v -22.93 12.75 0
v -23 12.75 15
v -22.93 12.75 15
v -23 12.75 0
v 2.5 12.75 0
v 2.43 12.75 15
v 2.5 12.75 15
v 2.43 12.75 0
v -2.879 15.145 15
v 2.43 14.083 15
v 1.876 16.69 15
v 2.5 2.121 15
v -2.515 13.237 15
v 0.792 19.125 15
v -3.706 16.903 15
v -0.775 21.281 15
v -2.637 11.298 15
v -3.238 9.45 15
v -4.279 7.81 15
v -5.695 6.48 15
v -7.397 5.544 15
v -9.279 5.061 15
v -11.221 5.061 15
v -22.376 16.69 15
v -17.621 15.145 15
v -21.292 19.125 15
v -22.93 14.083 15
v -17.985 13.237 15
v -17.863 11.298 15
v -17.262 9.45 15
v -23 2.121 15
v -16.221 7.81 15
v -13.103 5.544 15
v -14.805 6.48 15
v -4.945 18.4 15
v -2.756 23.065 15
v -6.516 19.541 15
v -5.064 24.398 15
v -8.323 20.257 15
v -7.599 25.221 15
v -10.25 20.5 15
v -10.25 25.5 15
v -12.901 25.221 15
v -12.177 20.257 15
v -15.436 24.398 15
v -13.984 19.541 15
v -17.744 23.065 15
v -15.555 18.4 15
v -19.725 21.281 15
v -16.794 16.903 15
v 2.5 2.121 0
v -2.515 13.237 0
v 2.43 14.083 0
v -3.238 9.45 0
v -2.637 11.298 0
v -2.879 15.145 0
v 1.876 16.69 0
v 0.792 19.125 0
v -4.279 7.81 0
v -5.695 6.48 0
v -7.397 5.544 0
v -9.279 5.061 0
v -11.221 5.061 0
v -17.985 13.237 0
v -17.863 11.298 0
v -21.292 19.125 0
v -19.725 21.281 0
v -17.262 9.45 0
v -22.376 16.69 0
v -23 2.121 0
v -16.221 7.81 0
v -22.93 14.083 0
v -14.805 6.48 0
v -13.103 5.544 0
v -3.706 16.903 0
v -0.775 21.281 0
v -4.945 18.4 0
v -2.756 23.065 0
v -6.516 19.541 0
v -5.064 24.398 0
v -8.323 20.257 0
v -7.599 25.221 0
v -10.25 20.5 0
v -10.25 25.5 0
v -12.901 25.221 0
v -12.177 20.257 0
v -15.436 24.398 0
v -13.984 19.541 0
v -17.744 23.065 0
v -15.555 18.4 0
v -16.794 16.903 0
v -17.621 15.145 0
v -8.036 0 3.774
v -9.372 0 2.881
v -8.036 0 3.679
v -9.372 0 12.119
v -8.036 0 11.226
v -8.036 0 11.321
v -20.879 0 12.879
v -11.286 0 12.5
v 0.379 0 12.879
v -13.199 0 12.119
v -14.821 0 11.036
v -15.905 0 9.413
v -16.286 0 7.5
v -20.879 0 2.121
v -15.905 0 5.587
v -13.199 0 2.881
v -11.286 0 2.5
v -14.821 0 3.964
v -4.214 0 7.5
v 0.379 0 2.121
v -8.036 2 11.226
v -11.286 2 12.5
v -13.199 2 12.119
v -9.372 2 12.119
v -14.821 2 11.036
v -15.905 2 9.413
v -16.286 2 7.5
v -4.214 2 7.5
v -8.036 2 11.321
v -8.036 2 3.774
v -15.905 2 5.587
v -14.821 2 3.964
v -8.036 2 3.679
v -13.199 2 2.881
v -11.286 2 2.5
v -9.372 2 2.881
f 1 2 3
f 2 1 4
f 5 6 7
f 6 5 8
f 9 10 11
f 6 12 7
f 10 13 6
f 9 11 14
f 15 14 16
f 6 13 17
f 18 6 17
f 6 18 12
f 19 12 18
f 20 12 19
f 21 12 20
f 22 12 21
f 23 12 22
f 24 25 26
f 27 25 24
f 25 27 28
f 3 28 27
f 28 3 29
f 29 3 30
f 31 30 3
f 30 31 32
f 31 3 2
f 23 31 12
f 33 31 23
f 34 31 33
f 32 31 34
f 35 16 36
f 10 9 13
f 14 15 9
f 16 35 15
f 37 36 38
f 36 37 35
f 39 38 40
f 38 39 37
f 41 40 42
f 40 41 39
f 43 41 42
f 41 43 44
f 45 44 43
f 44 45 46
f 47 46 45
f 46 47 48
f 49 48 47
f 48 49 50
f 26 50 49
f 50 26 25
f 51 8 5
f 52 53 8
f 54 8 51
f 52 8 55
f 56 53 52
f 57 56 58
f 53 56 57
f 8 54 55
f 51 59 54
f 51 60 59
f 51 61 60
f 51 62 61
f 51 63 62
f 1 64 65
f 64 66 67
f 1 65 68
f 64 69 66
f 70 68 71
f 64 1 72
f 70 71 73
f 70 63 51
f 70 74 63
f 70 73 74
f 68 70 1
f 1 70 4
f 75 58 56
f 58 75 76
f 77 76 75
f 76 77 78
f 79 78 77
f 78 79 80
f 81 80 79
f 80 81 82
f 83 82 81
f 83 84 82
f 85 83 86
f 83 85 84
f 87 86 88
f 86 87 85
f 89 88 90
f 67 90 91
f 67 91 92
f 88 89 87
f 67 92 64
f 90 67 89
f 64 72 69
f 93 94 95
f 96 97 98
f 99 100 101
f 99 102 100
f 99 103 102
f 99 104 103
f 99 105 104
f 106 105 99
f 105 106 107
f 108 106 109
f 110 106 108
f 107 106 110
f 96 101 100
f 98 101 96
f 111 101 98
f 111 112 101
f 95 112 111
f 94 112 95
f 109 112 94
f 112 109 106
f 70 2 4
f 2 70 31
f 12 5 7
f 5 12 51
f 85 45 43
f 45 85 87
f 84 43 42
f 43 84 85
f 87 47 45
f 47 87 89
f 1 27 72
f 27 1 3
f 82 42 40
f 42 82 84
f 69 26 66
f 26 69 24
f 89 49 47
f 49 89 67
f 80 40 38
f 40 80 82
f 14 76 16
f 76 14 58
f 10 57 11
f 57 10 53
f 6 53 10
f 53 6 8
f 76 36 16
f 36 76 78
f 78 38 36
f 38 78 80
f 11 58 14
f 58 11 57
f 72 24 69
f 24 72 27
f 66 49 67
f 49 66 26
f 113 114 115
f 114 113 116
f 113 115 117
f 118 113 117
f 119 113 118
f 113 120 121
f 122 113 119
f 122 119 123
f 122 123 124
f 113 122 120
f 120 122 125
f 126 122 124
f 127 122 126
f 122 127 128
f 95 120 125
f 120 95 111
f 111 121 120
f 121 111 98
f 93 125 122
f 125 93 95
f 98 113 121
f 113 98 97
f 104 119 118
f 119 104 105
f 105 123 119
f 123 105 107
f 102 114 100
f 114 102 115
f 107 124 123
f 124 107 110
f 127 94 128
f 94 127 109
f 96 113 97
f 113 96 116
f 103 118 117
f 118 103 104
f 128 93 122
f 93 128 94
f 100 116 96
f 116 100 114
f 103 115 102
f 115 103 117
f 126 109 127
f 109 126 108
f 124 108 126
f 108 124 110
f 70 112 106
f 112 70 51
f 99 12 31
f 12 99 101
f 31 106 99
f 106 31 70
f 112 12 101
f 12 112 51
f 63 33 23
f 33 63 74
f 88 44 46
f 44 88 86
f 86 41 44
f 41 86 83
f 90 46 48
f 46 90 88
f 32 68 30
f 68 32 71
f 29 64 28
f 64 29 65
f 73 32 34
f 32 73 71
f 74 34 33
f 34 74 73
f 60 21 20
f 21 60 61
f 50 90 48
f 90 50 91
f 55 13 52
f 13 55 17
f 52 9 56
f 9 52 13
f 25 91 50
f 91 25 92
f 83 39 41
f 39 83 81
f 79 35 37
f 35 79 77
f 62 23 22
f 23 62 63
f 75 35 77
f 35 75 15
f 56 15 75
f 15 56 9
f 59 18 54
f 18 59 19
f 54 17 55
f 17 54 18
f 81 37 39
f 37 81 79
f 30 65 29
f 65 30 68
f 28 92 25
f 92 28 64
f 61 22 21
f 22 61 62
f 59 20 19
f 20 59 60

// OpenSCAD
// Sized RepRap Power Ring
// By fillibar
// Description:
//   This ring is based on the parametric power ring. Rather than use specific values that
//   some may not know I used the "standard" ring sizes for most of the world. Enter the region
//   then the other parameters. The SizedPowerRing module will just call the normal PowerRing
//   module with the correct inner size.
//
// Based on:
//  Parametric RepRap Power Ring by Daniel Harmsworth (http://www.thingiverse.com/thing:3917)
//  RepRap Power Ring by Zack Hoeken (http://www.thingiverse.com/thing:48)
//  Ring sizes per Wikipedia (http://en.wikipedia.org/wiki/Ring_size)
//
// Licensed under the Creative Commons - GNU GPL, http://creativecommons.org/licenses/GPL/2.0/
//
// Parameters are as follows:
// 1) Sets ring sizing region. Values are:
//   0 for United States and Canada
//   1 for UK, Ireland, Australia & New Zealand (Please note: "" is needed around non-numerical values)
//   2 for India, China & Japan
//   3 for Switzerland
// 2) Sets internal ring size based on ring sizes for the region set in parameter 1.
// 3) Sets thickness of the ring (lengthways along the finger).
// 4) Sets depth of the RepRap logo embossed on the ring.
// 5) Sets whether the front edges are beveled or not.

// The following examples all generate the same ring, per region:
//SizedPowerRing ( 0, 13, 25, 1, true );
//SizedPowerRing ( 1, "N.5", 25, 1, true );
//SizedPowerRing ( 2, 14, 25, 1, true );
//SizedPowerRing ( 3, 15.25, 25, 1, true );
PowerRing( 15.5, 15, 2, true );

module SizedPowerRing ( region, size, thickness, depth, beveled )
{
  if ( region == 0 ) {
    if ( size == 0 ) {
      PowerRing( 11.63, thickness, depth, beveled );
    }
    if ( size == 0.25 ) {
      PowerRing( 11.84, thickness, depth, beveled );
    }
    if ( size == 0.5 ) {
      PowerRing( 12.04, thickness, depth, beveled );
    }
    if ( size == 0.75 ) {
      PowerRing( 12.24, thickness, depth, beveled );
    }
    if ( size == 1 ) {
      PowerRing( 12.45, thickness, depth, beveled );
    }
    if ( size == 1.25 ) {
      PowerRing( 12.65, thickness, depth, beveled );
    }
    if ( size == 1.5 ) {
      PowerRing( 12.85, thickness, depth, beveled );
    }
    if ( size == 1.75 ) {
      PowerRing( 13.06, thickness, depth, beveled );
    }
    if ( size == 2 ) {
      PowerRing( 13.26, thickness, depth, beveled );
    }
    if ( size == 2.25 ) {
      PowerRing( 13.46, thickness, depth, beveled );
    }
    if ( size == 2.5 ) {
      PowerRing( 13.67, thickness, depth, beveled );
    }
    if ( size == 2.75 ) {
      PowerRing( 13.87, thickness, depth, beveled );
    }
    if ( size == 3 ) {
      PowerRing( 14.07, thickness, depth, beveled );
    }
    if ( size == 3.25 ) {
      PowerRing( 14.27, thickness, depth, beveled );
    }
    if ( size == 3.5 ) {
      PowerRing( 14.48, thickness, depth, beveled );
    }
    if ( size == 3.75 ) {
      PowerRing( 14.68, thickness, depth, beveled );
    }
    if ( size == 4 ) {
      PowerRing( 14.88, thickness, depth, beveled );
    }
    if ( size == 4.25 ) {
      PowerRing( 15.09, thickness, depth, beveled );
    }
    if ( size == 4.5 ) {
      PowerRing( 15.29, thickness, depth, beveled );
    }
    if ( size == 4.75 ) {
      PowerRing( 15.49, thickness, depth, beveled );
    }
    if ( size == 5 ) {
      PowerRing( 15.70, thickness, depth, beveled );
    }
    if ( size == 5.25 ) {
      PowerRing( 15.90, thickness, depth, beveled );
    }
    if ( size == 5.5 ) {
      PowerRing( 16.10, thickness, depth, beveled );
    }
    if ( size == 5.75 ) {
      PowerRing( 16.31, thickness, depth, beveled );
    }
    if ( size == 6 ) {
      PowerRing( 16.51, thickness, depth, beveled );
    }
    if ( size == 6.25 ) {
      PowerRing( 16.71, thickness, depth, beveled );
    }
    if ( size == 6.5 ) {
      PowerRing( 16.92, thickness, depth, beveled );
    }
    if ( size == 6.75 ) {
      PowerRing( 17.12, thickness, depth, beveled );
    }
    if ( size == 7 ) {
      PowerRing( 17.32, thickness, depth, beveled );
    }
    if ( size == 7.25 ) {
      PowerRing( 17.53, thickness, depth, beveled );
    }
    if ( size == 7.5 ) {
      PowerRing( 17.73, thickness, depth, beveled );
    }
    if ( size == 7.75 ) {
      PowerRing( 17.93, thickness, depth, beveled );
    }
    if ( size == 8 ) {
      PowerRing( 18.14, thickness, depth, beveled );
    }
    if ( size == 8.25 ) {
      PowerRing( 18.34, thickness, depth, beveled );
    }
    if ( size == 8.5 ) {
      PowerRing( 18.54, thickness, depth, beveled );
    }
    if ( size == 8.75 ) {
      PowerRing( 18.75, thickness, depth, beveled );
    }
    if ( size == 9 ) {
      PowerRing( 18.95, thickness, depth, beveled );
    }
    if ( size == 9.25 ) {
      PowerRing( 19.15, thickness, depth, beveled );
    }
    if ( size == 9.5 ) {
      PowerRing( 19.35, thickness, depth, beveled );
    }
    if ( size == 9.75 ) {
      PowerRing( 19.56, thickness, depth, beveled );
    }
    if ( size == 10 ) {
      PowerRing( 19.76, thickness, depth, beveled );
    }
    if ( size == 10.25 ) {
      PowerRing( 19.96, thickness, depth, beveled );
    }
    if ( size == 10.5 ) {
      PowerRing( 20.17, thickness, depth, beveled );
    }
    if ( size == 10.75 ) {
      PowerRing( 20.37, thickness, depth, beveled );
    }
    if ( size == 11 ) {
      PowerRing( 20.57, thickness, depth, beveled );
    }
    if ( size == 11.25 ) {
      PowerRing( 20.78, thickness, depth, beveled );
    }
    if ( size == 11.5 ) {
      PowerRing( 20.98, thickness, depth, beveled );
    }
    if ( size == 11.75 ) {
      PowerRing( 21.18, thickness, depth, beveled );
    }
    if ( size == 12 ) {
      PowerRing( 21.39, thickness, depth, beveled );
    }
    if ( size == 12.25 ) {
      PowerRing( 21.59, thickness, depth, beveled );
    }
    if ( size == 12.5 ) {
      PowerRing( 21.79, thickness, depth, beveled );
    }
    if ( size == 12.75 ) {
      PowerRing( 22.00, thickness, depth, beveled );
    }
    if ( size == 13 ) {
      PowerRing( 22.20, thickness, depth, beveled );
    }
    if ( size == 13.25 ) {
      PowerRing( 22.40, thickness, depth, beveled );
    }
    if ( size == 13.5 ) {
      PowerRing( 22.61, thickness, depth, beveled );
    }
    if ( size == 13.75 ) {
      PowerRing( 22.81, thickness, depth, beveled );
    }
    if ( size == 14 ) {
      PowerRing( 23.01, thickness, depth, beveled );
    }
    if ( size == 14.25 ) {
      PowerRing( 23.22, thickness, depth, beveled );
    }
    if ( size == 14.5 ) {
      PowerRing( 23.42, thickness, depth, beveled );
    }
    if ( size == 14.75 ) {
      PowerRing( 23.62, thickness, depth, beveled );
    }
    if ( size == 15 ) {
      PowerRing( 23.83, thickness, depth, beveled );
    }
    if ( size == 15.25 ) {
      PowerRing( 24.03, thickness, depth, beveled );
    }
    if ( size == 15.5 ) {
      PowerRing( 24.23, thickness, depth, beveled );
    }
    if ( size == 15.75 ) {                                                                            
      PowerRing( 24.43, thickness, depth, beveled );
    }
    if ( size == 16 ) {                                                                                                       
      PowerRing( 24.64, thickness, depth, beveled );
    }
  } 
  if ( region == 1 ) {
    if ( size == "A" ) {
      PowerRing( 12.04, thickness, depth, beveled );
    }
    if ( size == "A.5" ) {
      PowerRing( 12.24, thickness, depth, beveled );
    }
    if ( size == "B" ) {
      PowerRing( 12.45, thickness, depth, beveled );
    }
    if ( size == "B.5" ) {
      PowerRing( 12.65, thickness, depth, beveled );
    }
    if ( size == "C" ) {
      PowerRing( 12.85, thickness, depth, beveled );
    }
    if ( size == "C.5" ) {
      PowerRing( 13.06, thickness, depth, beveled );
    }
    if ( size == "D" ) {
      PowerRing( 13.26, thickness, depth, beveled );
    }
    if ( size == "D.5" ) {
      PowerRing( 13.46, thickness, depth, beveled );
    }
    if ( size == "E" ) {
      PowerRing( 13.67, thickness, depth, beveled );
    }
    if ( size == "E.5" ) {
      PowerRing( 13.87, thickness, depth, beveled );
    }
    if ( size == "F" ) {
      PowerRing( 14.07, thickness, depth, beveled );
    }
    if ( size == "F.5" ) {
      PowerRing( 14.27, thickness, depth, beveled );
    }
    if ( size == "G" ) {
      PowerRing( 14.48, thickness, depth, beveled );
    }
    if ( size == "G.5" ) {
      PowerRing( 14.68, thickness, depth, beveled );
    }
    if ( size == "H" ) {
      PowerRing( 14.88, thickness, depth, beveled );
    }
    if ( size == "H.5" ) {
      PowerRing( 15.09, thickness, depth, beveled );
    }
    if ( size == "I" ) {
      PowerRing( 15.29, thickness, depth, beveled );
    }
    if ( size == "J" ) {
      PowerRing( 15.49, thickness, depth, beveled );
    }
    if ( size == "J.5" ) {
      PowerRing( 15.70, thickness, depth, beveled );
    }
    if ( size == "K" ) {
      PowerRing( 15.90, thickness, depth, beveled );
    }
    if ( size == "K.5" ) {
      PowerRing( 16.10, thickness, depth, beveled );
    }
    if ( size == "L" ) {
      PowerRing( 16.31, thickness, depth, beveled );
    }
    if ( size == "L.5" ) {
      PowerRing( 16.51, thickness, depth, beveled );
    }
    if ( size == "M" ) {
      PowerRing( 16.71, thickness, depth, beveled );
    }
    if ( size == "M.5" ) {
      PowerRing( 16.92, thickness, depth, beveled );
    }
    if ( size == "N" ) {
      PowerRing( 17.12, thickness, depth, beveled );
    }
    if ( size == "N.5" ) {
      PowerRing( 17.32, thickness, depth, beveled );
    }
    if ( size == "O" ) {
      PowerRing( 17.53, thickness, depth, beveled );
    }
    if ( size == "O.5" ) {
      PowerRing( 17.73, thickness, depth, beveled );
    }
    if ( size == "P" ) {
      PowerRing( 17.93, thickness, depth, beveled );
    }
    if ( size == "P.5" ) {
      PowerRing( 18.14, thickness, depth, beveled );
    }
    if ( size == "Q" ) {
      PowerRing( 18.34, thickness, depth, beveled );
    }
    if ( size == "Q.5" ) {
      PowerRing( 18.54, thickness, depth, beveled );
    }
    if ( size == "R" ) {
      PowerRing( 18.75, thickness, depth, beveled );
    }
    if ( size == "R.5" ) {
      PowerRing( 18.95, thickness, depth, beveled );
    }
    if ( size == "S" ) {
      PowerRing( 19.15, thickness, depth, beveled );
    }
    if ( size == "S.5" ) {
      PowerRing( 19.35, thickness, depth, beveled );
    }
    if ( size == "T" ) {
      PowerRing( 19.56, thickness, depth, beveled );
    }
    if ( size == "T.5" ) {
      PowerRing( 19.76, thickness, depth, beveled );
    }
    if ( size == "U" ) {
      PowerRing( 19.96, thickness, depth, beveled );
    }
    if ( size == "U.5" ) {
      PowerRing( 20.17, thickness, depth, beveled );
    }
    if ( size == "V" ) {
      PowerRing( 20.37, thickness, depth, beveled );
    }
    if ( size == "V.5" ) {
      PowerRing( 20.57, thickness, depth, beveled );
    }
    if ( size == "W" ) {
      PowerRing( 20.78, thickness, depth, beveled );
    }
    if ( size == "W.5" ) {
      PowerRing( 20.98, thickness, depth, beveled );
    }
    if ( size == "X" ) {
      PowerRing( 21.18, thickness, depth, beveled );
    }
    if ( size == "X.5" ) {
      PowerRing( 21.39, thickness, depth, beveled );
    }
    if ( size == "Y" ) {
      PowerRing( 21.59, thickness, depth, beveled );
    }
    if ( size == "Z" ) {
      PowerRing( 21.79, thickness, depth, beveled );
    }
    if ( size == "Z.5" ) {
      PowerRing( 22.00, thickness, depth, beveled );
    }
    if ( size == "Z1" ) {
      PowerRing( 22.40, thickness, depth, beveled );
    }
    if ( size == "Z2" ) {
      PowerRing( 22.81, thickness, depth, beveled );
    }
    if ( size == "Z3" ) {
      PowerRing( 23.01, thickness, depth, beveled );
    }
    if ( size == "Z4" ) {
     PowerRing( 23.42, thickness, depth, beveled );
    }
  }
  if ( region == 2 ) {
    if ( size == 1 ) {
      PowerRing( 12.45, thickness, depth, beveled );
    }
    if ( size == 2 ) {
      PowerRing( 13.26, thickness, depth, beveled );
    }
    if ( size == 3 ) {
      PowerRing( 13.67, thickness, depth, beveled );
    }
    if ( size == 4 ) {
      PowerRing( 14.07, thickness, depth, beveled );
    }
    if ( size == 5 ) {
      PowerRing( 14.27, thickness, depth, beveled );
    }
    if ( size == 6 ) {
      PowerRing( 14.68, thickness, depth, beveled );
    }
    if ( size == 7 ) {
      PowerRing( 14.88, thickness, depth, beveled );
    }
    if ( size == 8 ) {
      PowerRing( 15.29, thickness, depth, beveled );
    }
    if ( size == 9 ) {
      PowerRing( 15.70, thickness, depth, beveled );
    }
    if ( size == 10 ) {
      PowerRing( 16.10, thickness, depth, beveled );
    }
    if ( size == 11 ) {
      PowerRing( 16.51, thickness, depth, beveled );
    }
    if ( size == 12 ) {
      PowerRing( 16.71, thickness, depth, beveled );
    }
    if ( size == 13 ) {
      PowerRing( 16.92, thickness, depth, beveled );
    }
    if ( size == 14 ) {
      PowerRing( 17.32, thickness, depth, beveled );
    }
    if ( size == 15 ) {
      PowerRing( 17.73, thickness, depth, beveled );
    }
    if ( size == 16 ) {
      PowerRing( 18.14, thickness, depth, beveled );
    }
    if ( size == 17 ) {
      PowerRing( 18.54, thickness, depth, beveled );
    }
    if ( size == 18 ) {
      PowerRing( 18.95, thickness, depth, beveled );
    }
    if ( size == 19 ) {
      PowerRing( 19.35, thickness, depth, beveled );
    }
    if ( size == 20 ) {
      PowerRing( 19.76, thickness, depth, beveled );
    }
    if ( size == 21 ) {
      PowerRing( 19.96, thickness, depth, beveled );
    }
    if ( size == 22 ) {
      PowerRing( 20.17, thickness, depth, beveled );
    }
    if ( size == 23 ) {
      PowerRing( 20.57, thickness, depth, beveled );
    }
    if ( size == 24 ) {
      PowerRing( 20.98, thickness, depth, beveled );
    }
    if ( size == 25 ) {
      PowerRing( 21.39, thickness, depth, beveled );
    }
    if ( size == 26 ) {
      PowerRing( 21.79, thickness, depth, beveled );
    }
    if ( size == 27 ) {
      PowerRing( 22.20, thickness, depth, beveled );
    }
  }
  if ( region == 3 ) {
    if ( size == 1.5 ) {
      PowerRing( 13.26, thickness, depth, beveled );
    }
    if ( size == 2.75 ) {
      PowerRing( 13.67, thickness, depth, beveled );
    }
    if ( size == 4 ) {
      PowerRing( 14.07, thickness, depth, beveled );
    }
    if ( size == 5.25 ) {
      PowerRing( 14.27, thickness, depth, beveled );
    }
    if ( size == 6.5 ) {
      PowerRing( 14.68, thickness, depth, beveled );
    }
    if ( size == 7.75 ) {
      PowerRing( 15.09, thickness, depth, beveled );
    }
    if ( size == 9 ) {
      PowerRing( 15.49, thickness, depth, beveled );
    }
    if ( size == 10 ) {
      PowerRing( 15.90, thickness, depth, beveled );
    }
    if ( size == 11.75 ) {
      PowerRing( 16.31, thickness, depth, beveled );
    }
    if ( size == 12.75 ) {
      PowerRing( 16.51, thickness, depth, beveled );
    }
    if ( size == 14 ) {
      PowerRing( 16.92, thickness, depth, beveled );
    }
    if ( size == 15.25 ) {
      PowerRing( 17.32, thickness, depth, beveled );
    }
    if ( size == 16.5 ) {
      PowerRing( 17.73, thickness, depth, beveled );
    }
    if ( size == 17.75 ) {
      PowerRing( 18.14, thickness, depth, beveled );
    }
    if ( size == 19 ) {
      PowerRing( 18.75, thickness, depth, beveled );
    }
    if ( size == 20.25 ) {
      PowerRing( 19.15, thickness, depth, beveled );
    }
    if ( size == 21.5 ) {
      PowerRing( 19.56, thickness, depth, beveled );
    }
    if ( size == 22.75 ) {
      PowerRing( 20.17, thickness, depth, beveled );
    }
    if ( size == 25 ) {
      PowerRing( 20.78, thickness, depth, beveled );
    }
    if ( size == 27.5 ) {
      PowerRing( 21.39, thickness, depth, beveled );
    }
    if ( size == 28.75 ) {
      PowerRing( 21.79, thickness, depth, beveled );
    }
  }
}

module PowerRing ( diameter, thick, depth, bevel )
{
  rotate( a = [ 0, 0, 90 ] )
  {
    difference()
    {
      union ()
      {
        translate ( v = [0,-2.5,0] )
        cube( [ ( diameter / 2 ) + 5, diameter + 10, thick], center = false );
        translate( v = [ ( diameter / 2 ) + 5, ( diameter / 2 ) + 2.5, ] )
        cylinder( h = thick, r = ( diameter / 2 ) + 5 );
      }
     translate( v = [(diameter / 2) + 5,(diameter / 2) + 2.5,-1 ] )
     cylinder(h=thick+2,r=diameter / 2);
    
	translate( v = [-1,(diameter / 2) + 2.5,thick / 2] )
    rotate ( a = [90,0,0])  
	TearDrop(thick / 3,depth + 1);
     if (bevel)
      {
        translate ( v = [0,(diameter / 2)+2.5,0] )
        rotate ( a = [0,45,0])
        cube([3,diameter + 20,3],center = true);
        translate ( v = [0,(diameter / 2)+2.5,thick] )
        rotate ( a = [0,45,0])
        cube([3,diameter + 20,3],center = true);
        translate ( v = [0,diameter+7.5,(thick / 2)] )
        rotate ( a = [0,0,45]) 
        cube([3,3,thick + 10],center = true);
        translate ( v = [0,-2.5,(thick / 2)] )
        rotate ( a = [0,0,45])
        cube([3,3,thick + 10],center = true);
      }
    }
  }
}

module TearDrop(radius,depth)
{
  teardiff = (	sqrt(	( (radius * 2) * (radius * 2) ) * 2 ) - (radius * 2) ) / 2;
  translate(v = [depth/2,0,-teardiff / 2])
  rotate(a = [0,-90,0])
  union()
  {
    cylinder(h=depth,r=radius, center = true);
    intersection()
    {
      rotate(a = [0,0,45])
      cube([2*radius,2*radius,depth], center = true);
      translate([1.65*radius, 0, 0])
      cube([2*radius,2*radius,depth], center = true);
    }
  }
}
